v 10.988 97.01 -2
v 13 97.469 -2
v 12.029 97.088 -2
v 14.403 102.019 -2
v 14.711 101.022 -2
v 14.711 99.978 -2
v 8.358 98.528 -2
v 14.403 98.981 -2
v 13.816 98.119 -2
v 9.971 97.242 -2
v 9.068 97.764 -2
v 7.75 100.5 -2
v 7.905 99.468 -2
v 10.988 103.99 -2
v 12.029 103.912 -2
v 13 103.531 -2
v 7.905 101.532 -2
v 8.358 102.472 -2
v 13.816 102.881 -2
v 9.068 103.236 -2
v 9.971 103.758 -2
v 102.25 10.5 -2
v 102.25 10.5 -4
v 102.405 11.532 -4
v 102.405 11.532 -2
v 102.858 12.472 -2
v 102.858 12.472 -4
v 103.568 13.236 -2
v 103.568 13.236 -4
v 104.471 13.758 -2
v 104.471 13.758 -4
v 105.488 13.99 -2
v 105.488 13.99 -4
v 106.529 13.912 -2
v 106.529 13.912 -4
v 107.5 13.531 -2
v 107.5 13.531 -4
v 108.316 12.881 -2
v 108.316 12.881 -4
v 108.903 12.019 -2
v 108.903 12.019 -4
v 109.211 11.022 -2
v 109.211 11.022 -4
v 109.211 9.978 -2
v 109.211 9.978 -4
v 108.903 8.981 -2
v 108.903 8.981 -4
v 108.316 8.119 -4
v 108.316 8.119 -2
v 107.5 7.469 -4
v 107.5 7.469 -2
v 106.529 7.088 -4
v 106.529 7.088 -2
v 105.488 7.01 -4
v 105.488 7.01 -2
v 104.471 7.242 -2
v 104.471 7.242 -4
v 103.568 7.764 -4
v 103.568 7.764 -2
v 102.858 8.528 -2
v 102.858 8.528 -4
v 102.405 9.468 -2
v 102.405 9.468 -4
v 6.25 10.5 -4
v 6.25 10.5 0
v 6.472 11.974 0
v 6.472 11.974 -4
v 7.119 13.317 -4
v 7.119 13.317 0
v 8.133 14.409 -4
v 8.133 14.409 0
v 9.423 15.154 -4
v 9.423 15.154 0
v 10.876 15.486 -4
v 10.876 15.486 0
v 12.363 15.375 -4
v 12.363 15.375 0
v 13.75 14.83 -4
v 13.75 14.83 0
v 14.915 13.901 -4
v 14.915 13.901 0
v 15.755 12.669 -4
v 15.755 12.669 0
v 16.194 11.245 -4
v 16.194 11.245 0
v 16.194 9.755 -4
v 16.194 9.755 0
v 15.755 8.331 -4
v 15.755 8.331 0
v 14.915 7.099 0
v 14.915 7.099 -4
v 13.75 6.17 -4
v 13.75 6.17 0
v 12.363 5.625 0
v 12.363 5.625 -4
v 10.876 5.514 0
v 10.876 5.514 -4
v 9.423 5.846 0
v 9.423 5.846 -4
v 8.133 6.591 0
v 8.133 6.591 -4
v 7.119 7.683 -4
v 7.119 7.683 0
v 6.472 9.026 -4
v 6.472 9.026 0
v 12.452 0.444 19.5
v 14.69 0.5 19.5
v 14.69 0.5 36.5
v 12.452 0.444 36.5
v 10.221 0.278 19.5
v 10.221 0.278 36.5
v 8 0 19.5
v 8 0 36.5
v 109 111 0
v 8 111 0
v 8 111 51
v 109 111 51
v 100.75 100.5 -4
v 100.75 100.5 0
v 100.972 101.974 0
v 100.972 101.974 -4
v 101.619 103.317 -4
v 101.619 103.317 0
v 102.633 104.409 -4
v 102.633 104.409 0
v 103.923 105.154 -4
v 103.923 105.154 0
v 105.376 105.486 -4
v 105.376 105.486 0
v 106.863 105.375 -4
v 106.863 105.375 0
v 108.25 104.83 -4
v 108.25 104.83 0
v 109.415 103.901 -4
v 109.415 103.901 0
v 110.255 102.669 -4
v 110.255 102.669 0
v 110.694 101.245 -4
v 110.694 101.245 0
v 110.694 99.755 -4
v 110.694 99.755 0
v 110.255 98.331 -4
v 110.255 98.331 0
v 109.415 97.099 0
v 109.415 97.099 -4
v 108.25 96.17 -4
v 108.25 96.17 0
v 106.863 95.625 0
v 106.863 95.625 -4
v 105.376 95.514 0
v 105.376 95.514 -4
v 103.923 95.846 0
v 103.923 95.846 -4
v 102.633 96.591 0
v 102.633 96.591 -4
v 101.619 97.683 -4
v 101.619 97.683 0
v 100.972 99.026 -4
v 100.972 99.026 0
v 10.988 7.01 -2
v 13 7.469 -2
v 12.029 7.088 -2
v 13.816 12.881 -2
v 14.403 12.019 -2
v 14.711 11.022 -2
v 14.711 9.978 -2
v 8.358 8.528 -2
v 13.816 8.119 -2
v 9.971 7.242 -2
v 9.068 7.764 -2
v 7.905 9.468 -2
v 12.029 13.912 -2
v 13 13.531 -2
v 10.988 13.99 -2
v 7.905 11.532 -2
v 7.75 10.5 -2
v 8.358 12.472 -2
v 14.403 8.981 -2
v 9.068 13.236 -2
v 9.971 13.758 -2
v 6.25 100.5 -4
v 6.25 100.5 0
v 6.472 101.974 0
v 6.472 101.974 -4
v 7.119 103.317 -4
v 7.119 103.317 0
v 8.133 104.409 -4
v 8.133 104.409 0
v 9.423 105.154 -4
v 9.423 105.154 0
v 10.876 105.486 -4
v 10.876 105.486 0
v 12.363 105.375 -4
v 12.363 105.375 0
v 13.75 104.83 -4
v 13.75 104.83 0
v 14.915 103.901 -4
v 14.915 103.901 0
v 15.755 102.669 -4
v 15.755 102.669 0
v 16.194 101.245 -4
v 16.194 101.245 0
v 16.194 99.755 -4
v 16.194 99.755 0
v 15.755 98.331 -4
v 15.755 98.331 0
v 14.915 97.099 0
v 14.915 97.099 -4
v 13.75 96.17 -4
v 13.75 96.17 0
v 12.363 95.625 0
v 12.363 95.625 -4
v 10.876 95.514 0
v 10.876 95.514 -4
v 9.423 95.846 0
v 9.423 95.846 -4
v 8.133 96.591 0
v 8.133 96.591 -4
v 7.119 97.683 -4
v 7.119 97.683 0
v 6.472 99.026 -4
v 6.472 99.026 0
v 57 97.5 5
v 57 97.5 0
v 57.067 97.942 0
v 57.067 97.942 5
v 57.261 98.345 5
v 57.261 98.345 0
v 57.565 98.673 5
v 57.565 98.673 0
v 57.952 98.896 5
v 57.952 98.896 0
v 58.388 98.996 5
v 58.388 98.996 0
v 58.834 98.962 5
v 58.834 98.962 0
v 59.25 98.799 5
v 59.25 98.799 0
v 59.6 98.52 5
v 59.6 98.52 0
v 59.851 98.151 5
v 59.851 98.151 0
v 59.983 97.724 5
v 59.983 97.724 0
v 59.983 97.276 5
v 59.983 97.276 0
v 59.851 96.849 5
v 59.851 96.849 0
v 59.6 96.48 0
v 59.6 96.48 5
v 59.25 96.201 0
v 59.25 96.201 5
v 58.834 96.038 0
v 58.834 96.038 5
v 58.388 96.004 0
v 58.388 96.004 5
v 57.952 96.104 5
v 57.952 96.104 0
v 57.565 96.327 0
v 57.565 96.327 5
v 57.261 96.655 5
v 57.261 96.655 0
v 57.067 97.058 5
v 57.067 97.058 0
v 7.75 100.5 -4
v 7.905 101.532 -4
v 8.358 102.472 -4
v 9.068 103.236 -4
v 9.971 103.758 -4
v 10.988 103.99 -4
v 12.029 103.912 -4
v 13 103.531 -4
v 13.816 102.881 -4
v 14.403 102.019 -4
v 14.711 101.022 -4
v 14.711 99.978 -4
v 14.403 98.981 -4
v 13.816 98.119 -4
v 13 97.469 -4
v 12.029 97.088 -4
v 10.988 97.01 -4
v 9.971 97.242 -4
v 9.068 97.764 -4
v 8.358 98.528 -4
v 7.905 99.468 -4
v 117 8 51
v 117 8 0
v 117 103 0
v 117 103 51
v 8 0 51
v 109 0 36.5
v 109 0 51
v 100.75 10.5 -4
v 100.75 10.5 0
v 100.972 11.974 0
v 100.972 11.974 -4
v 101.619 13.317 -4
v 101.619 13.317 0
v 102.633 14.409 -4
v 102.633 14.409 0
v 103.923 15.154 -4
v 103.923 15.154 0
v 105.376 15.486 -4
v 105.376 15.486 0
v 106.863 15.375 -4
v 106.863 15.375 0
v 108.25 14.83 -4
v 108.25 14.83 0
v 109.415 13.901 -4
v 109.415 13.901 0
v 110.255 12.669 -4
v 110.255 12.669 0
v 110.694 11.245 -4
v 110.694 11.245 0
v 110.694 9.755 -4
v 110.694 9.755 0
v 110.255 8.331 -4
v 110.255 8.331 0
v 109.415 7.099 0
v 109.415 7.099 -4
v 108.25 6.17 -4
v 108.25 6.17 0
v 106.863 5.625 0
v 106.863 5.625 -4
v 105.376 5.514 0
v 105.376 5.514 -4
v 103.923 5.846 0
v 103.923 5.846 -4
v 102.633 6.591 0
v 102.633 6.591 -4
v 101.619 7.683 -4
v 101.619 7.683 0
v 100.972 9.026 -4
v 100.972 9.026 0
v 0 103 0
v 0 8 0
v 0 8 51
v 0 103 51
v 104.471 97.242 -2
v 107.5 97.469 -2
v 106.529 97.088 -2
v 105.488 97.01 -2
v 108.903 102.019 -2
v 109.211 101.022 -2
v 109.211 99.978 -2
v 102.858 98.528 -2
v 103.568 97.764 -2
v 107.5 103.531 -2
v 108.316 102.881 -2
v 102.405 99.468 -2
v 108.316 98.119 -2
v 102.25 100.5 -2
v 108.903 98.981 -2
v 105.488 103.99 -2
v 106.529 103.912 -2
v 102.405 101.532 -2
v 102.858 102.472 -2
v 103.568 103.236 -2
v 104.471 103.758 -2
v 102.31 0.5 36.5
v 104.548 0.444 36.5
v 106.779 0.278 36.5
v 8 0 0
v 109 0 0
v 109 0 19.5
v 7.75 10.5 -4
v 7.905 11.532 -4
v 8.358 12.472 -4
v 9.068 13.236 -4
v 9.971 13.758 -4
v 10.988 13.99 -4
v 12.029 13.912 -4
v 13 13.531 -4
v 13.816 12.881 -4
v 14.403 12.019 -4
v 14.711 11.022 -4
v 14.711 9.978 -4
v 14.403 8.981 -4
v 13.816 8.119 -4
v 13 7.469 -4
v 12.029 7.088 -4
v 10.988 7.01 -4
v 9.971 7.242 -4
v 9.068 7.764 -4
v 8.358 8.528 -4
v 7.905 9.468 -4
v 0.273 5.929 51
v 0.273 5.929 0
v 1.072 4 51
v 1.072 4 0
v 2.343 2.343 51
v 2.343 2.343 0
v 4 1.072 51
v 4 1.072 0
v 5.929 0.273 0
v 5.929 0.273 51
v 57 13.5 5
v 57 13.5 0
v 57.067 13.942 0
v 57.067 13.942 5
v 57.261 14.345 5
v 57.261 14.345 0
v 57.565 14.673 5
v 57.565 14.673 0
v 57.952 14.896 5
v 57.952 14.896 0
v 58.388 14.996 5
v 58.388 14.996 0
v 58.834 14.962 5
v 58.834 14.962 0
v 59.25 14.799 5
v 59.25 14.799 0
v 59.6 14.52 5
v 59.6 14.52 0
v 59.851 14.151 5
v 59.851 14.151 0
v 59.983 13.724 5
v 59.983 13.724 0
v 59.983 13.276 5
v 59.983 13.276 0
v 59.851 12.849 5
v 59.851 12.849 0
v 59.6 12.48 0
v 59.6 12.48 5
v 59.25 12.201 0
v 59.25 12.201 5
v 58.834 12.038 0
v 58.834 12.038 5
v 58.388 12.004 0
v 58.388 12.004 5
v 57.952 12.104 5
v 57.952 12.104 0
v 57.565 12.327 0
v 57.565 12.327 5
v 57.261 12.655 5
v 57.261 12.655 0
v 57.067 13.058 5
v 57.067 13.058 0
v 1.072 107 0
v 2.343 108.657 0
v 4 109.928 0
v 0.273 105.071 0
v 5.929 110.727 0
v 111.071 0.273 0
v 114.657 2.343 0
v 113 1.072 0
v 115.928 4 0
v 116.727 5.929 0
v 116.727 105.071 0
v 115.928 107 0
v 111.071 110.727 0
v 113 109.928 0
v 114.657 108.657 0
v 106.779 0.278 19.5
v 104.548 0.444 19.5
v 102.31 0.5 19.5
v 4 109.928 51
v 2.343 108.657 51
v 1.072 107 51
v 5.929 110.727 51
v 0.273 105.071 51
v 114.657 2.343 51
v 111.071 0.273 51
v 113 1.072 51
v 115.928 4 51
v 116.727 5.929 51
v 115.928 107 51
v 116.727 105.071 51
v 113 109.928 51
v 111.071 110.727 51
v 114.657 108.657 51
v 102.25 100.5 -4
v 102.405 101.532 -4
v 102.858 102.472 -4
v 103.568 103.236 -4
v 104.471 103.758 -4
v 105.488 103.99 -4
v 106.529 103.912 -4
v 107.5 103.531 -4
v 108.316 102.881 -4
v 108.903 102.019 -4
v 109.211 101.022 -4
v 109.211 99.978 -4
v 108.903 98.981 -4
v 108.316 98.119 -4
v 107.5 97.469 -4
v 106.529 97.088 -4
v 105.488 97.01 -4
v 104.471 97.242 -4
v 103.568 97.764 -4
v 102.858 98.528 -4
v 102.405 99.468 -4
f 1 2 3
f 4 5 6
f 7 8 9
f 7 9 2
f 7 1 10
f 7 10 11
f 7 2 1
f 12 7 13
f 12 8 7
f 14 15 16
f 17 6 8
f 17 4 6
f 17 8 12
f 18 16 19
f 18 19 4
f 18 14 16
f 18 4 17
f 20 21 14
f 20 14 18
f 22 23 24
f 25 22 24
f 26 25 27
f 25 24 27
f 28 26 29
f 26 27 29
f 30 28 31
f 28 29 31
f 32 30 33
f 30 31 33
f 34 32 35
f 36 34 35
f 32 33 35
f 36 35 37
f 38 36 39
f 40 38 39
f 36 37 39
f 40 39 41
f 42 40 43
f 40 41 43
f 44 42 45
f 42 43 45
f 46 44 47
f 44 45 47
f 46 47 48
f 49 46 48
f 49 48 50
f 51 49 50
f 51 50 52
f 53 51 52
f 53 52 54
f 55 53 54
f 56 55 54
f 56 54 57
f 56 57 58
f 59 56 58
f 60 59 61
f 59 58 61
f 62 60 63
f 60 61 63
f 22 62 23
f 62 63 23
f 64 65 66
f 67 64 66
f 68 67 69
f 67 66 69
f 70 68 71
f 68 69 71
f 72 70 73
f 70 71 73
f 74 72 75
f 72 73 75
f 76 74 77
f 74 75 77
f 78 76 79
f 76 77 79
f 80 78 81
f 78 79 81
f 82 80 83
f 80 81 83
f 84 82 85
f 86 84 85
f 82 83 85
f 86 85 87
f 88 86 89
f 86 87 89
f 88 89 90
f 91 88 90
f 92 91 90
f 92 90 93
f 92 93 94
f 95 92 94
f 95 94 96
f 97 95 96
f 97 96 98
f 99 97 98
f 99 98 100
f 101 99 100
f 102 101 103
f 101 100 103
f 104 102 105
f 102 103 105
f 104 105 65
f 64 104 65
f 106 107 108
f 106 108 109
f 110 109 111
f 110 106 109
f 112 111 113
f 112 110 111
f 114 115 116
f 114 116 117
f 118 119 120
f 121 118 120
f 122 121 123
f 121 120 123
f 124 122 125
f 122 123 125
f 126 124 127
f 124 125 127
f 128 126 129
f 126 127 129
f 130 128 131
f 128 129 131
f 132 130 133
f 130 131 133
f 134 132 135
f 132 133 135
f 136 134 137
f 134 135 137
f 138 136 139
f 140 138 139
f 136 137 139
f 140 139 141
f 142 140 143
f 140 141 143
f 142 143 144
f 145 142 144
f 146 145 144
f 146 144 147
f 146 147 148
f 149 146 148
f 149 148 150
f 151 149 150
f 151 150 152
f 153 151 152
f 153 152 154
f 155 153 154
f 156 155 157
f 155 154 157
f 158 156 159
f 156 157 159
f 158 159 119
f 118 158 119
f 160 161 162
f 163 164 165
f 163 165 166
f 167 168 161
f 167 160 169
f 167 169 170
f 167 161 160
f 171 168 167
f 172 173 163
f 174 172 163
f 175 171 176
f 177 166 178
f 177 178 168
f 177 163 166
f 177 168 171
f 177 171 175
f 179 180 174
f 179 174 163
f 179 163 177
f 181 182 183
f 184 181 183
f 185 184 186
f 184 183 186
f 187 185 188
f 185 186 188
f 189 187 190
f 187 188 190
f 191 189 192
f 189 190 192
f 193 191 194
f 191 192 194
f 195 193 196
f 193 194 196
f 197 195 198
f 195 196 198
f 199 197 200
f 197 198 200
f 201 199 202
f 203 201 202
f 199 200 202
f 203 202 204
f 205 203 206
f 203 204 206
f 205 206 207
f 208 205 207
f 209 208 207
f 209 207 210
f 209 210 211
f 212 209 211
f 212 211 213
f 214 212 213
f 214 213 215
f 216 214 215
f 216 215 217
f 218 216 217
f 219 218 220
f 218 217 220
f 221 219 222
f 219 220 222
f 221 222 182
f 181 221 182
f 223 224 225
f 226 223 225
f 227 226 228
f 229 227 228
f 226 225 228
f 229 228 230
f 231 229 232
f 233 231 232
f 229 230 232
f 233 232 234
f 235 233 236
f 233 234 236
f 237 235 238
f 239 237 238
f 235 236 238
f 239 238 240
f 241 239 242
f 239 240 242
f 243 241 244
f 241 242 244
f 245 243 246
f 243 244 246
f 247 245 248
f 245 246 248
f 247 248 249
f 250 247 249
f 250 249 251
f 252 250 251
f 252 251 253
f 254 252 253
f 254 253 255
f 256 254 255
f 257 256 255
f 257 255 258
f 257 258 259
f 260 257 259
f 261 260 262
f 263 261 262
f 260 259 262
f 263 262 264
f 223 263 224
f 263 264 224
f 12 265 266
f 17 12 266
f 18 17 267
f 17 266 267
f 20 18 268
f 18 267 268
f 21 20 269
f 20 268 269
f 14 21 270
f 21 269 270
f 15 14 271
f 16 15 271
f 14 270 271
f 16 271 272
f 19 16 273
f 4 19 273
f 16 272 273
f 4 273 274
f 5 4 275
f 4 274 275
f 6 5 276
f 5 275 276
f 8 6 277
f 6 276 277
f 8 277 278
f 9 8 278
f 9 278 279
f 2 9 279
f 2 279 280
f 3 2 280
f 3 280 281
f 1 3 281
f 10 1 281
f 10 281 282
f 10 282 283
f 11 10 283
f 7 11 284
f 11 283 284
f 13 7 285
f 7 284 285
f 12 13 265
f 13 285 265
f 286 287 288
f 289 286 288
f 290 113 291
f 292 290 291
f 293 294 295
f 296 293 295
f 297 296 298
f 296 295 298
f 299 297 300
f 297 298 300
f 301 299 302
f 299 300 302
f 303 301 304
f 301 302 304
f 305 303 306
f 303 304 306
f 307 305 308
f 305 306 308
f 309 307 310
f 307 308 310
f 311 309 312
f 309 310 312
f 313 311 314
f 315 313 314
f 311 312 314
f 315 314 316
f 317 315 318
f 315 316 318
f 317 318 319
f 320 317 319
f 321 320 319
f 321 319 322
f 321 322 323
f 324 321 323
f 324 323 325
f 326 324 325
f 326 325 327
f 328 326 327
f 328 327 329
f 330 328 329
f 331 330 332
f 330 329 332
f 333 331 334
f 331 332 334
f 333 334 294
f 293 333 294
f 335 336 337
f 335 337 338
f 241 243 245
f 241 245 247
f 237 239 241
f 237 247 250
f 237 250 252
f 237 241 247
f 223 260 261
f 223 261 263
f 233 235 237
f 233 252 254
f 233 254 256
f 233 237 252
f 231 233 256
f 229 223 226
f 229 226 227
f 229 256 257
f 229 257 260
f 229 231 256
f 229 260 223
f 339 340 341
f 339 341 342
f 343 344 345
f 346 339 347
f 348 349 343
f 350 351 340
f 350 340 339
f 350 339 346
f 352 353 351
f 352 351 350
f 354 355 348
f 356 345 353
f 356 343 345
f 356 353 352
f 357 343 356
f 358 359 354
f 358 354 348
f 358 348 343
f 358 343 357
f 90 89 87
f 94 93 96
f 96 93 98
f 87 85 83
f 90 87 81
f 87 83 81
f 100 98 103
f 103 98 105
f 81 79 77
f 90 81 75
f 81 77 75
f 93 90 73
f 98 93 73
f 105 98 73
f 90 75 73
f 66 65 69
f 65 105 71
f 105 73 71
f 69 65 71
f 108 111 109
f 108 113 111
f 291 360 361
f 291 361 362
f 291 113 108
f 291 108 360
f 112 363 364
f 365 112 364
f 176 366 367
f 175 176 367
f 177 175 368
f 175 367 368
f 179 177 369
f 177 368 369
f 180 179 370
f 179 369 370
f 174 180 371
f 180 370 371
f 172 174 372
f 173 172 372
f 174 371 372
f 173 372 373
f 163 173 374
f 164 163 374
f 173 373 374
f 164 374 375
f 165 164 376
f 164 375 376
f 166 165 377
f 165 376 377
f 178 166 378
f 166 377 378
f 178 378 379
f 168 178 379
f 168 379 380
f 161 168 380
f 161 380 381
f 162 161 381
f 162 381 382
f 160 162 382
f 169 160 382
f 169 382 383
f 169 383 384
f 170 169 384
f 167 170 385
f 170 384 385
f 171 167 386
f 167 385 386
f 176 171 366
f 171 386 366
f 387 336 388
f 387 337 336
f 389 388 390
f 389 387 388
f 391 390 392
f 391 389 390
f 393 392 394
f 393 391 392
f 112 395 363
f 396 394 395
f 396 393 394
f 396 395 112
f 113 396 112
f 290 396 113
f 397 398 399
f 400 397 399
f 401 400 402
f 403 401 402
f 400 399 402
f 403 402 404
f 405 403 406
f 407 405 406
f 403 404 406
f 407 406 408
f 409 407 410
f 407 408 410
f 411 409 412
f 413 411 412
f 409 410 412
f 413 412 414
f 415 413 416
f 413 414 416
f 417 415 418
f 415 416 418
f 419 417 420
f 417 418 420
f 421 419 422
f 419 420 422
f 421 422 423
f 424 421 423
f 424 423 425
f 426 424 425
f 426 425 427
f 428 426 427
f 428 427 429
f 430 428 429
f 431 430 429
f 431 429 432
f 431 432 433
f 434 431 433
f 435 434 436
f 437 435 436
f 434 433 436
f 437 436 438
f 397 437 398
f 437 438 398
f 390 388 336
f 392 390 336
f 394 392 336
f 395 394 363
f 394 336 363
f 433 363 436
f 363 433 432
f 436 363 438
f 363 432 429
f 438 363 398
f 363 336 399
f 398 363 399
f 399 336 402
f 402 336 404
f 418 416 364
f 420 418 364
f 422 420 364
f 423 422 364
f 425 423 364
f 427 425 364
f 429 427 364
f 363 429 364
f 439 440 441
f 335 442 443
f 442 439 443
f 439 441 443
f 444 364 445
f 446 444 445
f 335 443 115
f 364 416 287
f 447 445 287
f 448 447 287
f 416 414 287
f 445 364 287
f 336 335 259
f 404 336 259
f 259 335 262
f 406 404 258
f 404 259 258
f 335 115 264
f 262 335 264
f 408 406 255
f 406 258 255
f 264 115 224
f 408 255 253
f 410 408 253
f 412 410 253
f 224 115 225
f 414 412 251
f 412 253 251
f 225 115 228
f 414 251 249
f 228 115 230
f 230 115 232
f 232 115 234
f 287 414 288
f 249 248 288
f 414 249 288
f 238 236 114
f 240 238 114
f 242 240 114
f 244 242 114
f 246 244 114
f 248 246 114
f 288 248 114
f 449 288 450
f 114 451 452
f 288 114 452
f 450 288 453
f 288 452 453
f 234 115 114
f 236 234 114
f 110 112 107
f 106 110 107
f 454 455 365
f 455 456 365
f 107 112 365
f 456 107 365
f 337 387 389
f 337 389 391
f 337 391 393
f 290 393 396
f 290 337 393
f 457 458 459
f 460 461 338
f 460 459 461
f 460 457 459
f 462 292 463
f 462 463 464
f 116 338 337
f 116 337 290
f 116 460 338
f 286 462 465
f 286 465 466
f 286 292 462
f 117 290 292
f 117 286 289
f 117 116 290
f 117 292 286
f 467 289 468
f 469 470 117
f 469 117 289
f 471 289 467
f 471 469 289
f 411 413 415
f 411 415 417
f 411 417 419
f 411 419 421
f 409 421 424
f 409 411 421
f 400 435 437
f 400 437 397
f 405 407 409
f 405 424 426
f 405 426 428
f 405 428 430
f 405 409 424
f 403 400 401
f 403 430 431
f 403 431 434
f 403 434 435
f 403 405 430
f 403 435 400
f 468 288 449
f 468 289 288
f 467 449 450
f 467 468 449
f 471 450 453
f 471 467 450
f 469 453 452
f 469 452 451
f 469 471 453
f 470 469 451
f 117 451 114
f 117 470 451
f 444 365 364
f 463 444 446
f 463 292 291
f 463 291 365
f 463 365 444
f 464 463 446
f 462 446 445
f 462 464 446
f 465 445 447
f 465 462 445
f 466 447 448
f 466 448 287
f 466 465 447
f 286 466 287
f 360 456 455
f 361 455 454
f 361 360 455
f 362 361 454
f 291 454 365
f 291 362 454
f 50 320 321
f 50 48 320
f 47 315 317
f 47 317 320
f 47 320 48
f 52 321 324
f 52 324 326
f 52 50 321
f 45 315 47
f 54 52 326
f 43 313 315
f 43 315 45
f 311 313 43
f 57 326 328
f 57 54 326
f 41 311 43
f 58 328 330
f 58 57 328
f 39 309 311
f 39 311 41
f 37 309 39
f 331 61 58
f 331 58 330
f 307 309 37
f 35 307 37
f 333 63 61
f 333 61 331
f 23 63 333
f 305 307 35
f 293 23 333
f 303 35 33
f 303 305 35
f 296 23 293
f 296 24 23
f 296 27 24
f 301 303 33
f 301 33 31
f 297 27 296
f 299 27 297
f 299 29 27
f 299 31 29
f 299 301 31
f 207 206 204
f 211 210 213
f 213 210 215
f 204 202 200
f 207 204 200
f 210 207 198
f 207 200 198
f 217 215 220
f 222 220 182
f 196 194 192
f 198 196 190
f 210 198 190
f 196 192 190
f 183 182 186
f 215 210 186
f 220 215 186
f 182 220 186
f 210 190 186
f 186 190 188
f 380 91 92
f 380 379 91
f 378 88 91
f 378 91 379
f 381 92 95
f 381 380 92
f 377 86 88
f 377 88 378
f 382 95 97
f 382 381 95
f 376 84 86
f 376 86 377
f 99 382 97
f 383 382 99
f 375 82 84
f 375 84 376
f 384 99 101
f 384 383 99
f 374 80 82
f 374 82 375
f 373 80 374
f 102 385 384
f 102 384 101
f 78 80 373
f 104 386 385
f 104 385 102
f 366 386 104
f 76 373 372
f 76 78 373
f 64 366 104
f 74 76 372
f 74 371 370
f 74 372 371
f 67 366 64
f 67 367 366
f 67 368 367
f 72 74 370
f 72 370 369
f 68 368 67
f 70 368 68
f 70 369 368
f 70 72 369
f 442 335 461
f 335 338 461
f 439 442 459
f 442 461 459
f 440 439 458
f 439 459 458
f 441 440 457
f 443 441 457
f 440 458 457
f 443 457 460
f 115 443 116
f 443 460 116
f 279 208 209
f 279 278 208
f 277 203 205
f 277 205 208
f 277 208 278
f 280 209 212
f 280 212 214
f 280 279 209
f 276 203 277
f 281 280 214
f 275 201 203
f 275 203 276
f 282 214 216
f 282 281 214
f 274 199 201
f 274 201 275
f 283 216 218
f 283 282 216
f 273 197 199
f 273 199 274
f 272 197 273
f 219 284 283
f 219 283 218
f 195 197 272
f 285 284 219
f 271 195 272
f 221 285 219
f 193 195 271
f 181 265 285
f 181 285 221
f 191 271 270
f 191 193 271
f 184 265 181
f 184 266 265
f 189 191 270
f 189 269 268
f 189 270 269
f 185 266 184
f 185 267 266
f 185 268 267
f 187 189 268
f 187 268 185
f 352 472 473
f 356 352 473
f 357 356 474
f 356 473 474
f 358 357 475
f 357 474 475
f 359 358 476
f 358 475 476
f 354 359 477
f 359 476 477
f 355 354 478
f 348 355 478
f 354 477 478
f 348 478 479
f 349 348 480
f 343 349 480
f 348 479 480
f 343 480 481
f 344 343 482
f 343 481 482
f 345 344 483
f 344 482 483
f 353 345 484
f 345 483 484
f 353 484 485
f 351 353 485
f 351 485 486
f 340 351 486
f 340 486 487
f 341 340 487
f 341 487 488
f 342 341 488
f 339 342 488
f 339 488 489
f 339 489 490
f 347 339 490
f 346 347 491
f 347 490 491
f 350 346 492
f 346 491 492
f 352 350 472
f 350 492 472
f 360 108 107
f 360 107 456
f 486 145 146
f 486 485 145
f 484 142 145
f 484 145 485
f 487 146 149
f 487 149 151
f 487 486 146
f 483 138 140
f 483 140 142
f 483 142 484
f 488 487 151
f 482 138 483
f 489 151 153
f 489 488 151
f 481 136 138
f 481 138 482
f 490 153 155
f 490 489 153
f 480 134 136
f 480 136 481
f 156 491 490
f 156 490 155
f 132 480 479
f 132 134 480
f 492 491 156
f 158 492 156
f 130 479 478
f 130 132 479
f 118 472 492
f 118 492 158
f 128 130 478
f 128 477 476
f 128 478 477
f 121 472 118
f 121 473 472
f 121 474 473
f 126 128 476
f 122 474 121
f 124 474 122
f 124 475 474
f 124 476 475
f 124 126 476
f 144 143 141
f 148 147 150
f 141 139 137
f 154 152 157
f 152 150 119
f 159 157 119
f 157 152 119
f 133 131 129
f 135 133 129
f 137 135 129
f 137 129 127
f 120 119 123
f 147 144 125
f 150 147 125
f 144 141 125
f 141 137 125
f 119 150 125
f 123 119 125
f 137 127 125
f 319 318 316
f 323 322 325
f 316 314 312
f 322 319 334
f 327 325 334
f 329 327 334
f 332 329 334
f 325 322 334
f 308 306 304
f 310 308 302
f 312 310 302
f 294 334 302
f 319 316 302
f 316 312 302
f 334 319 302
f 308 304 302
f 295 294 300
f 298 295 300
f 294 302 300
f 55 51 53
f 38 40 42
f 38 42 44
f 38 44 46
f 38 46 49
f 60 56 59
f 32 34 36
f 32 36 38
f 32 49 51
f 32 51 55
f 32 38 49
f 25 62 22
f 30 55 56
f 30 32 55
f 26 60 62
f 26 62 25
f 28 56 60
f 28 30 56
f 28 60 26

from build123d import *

# Parameters (mm, degrees)
SKETCH_1_W          = 117
SKETCH_1_H          = 111
EXTRUDE_1_DEPTH     = 51
FILLET_1_R          = 8
SKETCH_2_W          = 101
SKETCH_2_H          = 17
CUT_EXTRUDE_1_DEPTH = 0.5
FILLET_2_R          = 45
SKETCH_4_R          = 5
EXTRUDE_3_DEPTH     = 4
EXTRUDE_3_2_DEPTH   = 4
EXTRUDE_3_3_DEPTH   = 4
EXTRUDE_3_4_DEPTH   = 4
SKETCH_5_R          = 3.5
CUT_EXTRUDE_2_DEPTH = 2
SKETCH_6_R          = 1.5
CUT_EXTRUDE_3_DEPTH = 5


with BuildPart() as part:
    # 草图1 → 凸台-拉伸1 (new body)
    with BuildSketch(Plane.XY):
        with Locations((58.5, 55.5)):
            Rectangle(SKETCH_1_W, SKETCH_1_H)
    extrude(amount=EXTRUDE_1_DEPTH)

    # 圆角1
    fillet_1_edges = [part.edges().sort_by_distance(p)[0] for p in [
        (0, 111, 25.5),
        (117, 111, 25.5),
        (117, 0, 25.5),
        (0, 0, 25.5),
    ]]
    fillet(fillet_1_edges, radius=FILLET_1_R)

    # 草图2 → 切除-拉伸1 (cut)
    with BuildSketch(Plane.XZ):
        with Locations((58.5, 28)):
            Rectangle(SKETCH_2_W, SKETCH_2_H)
    extrude(amount=-CUT_EXTRUDE_1_DEPTH, mode=Mode.SUBTRACT)

    # 圆角2
    # the kernel refuses this fillet: 45 mm, written as the material it adds along each edge
    with BuildSketch(Plane(origin=(109, 0.5, 36.5), x_dir=(0, -1, 0), z_dir=(0, 0, -1)), Plane(origin=(8, 0.5, 2.7761398), x_dir=(0, -1, 0), z_dir=(0, 0, 1))) as fillet_2_piece_1:
        with BuildLine():
            CenterArc((45, 6.68954408), FILLET_2_R, 180, 8.549078831)
            Line((0, 6.68954408), (0, 0))
            Line((0, 0), (0.5, 0))
        make_face()
    extrude(amount=33.7238602)

    # 草图6 → 切除-拉伸3 (cut)
    with BuildSketch(Plane(origin=(0, 0, 0), x_dir=(-1, 0, 0), z_dir=(0, 0, -1))):
        with Locations((-58.5, 97.5)):
            Circle(SKETCH_6_R)
        with Locations((-58.5, 13.5)):
            Circle(SKETCH_6_R)
    extrude(amount=-CUT_EXTRUDE_3_DEPTH, mode=Mode.SUBTRACT)


with BuildPart() as body_2:
    # 草图4 → 凸台-拉伸3 (new body)
    with BuildSketch(Plane(origin=(0, 0, 0), x_dir=(-1, 0, 0), z_dir=(0, 0, -1))):
        with Locations((-105.75, 100.5)):
            Circle(SKETCH_4_R)
    extrude(amount=EXTRUDE_3_DEPTH)


with BuildPart() as body_3:
    # 草图4 → Extrude 3 2 (new body)
    with BuildSketch(Plane(origin=(0, 0, 0), x_dir=(-1, 0, 0), z_dir=(0, 0, -1))):
        with Locations((-105.75, 10.5)):
            Circle(SKETCH_4_R)
    extrude(amount=EXTRUDE_3_2_DEPTH)


with BuildPart() as body_4:
    # 草图4 → Extrude 3 3 (new body)
    with BuildSketch(Plane(origin=(0, 0, 0), x_dir=(-1, 0, 0), z_dir=(0, 0, -1))):
        with Locations((-11.25, 10.5)):
            Circle(SKETCH_4_R)
    extrude(amount=EXTRUDE_3_3_DEPTH)


with BuildPart() as body_5:
    # 草图4 → Extrude 3 4 (new body)
    with BuildSketch(Plane(origin=(0, 0, 0), x_dir=(-1, 0, 0), z_dir=(0, 0, -1))):
        with Locations((-11.25, 100.5)):
            Circle(SKETCH_4_R)
    extrude(amount=EXTRUDE_3_4_DEPTH)


with BuildPart() as cut_extrude_2_tool:
    # 草图5 → 切除-拉伸2 (new body)
    with BuildSketch(Plane(origin=(0, 0, -4), x_dir=(-1, 0, 0), z_dir=(0, 0, -1))):
        with Locations((-105.75, 100.5)):
            Circle(SKETCH_5_R)
        with Locations((-105.75, 10.5)):
            Circle(SKETCH_5_R)
        with Locations((-11.25, 10.5)):
            Circle(SKETCH_5_R)
        with Locations((-11.25, 100.5)):
            Circle(SKETCH_5_R)
    extrude(amount=-CUT_EXTRUDE_2_DEPTH)


with BuildPart() as body_2_1:
    add(body_2.part)

    # 切除-拉伸2: cut by cut_extrude_2_tool
    add(cut_extrude_2_tool.part, mode=Mode.SUBTRACT)


with BuildPart() as body_3_1:
    add(body_3.part)

    # 切除-拉伸2: cut by cut_extrude_2_tool
    add(cut_extrude_2_tool.part, mode=Mode.SUBTRACT)


with BuildPart() as body_4_1:
    add(body_4.part)

    # 切除-拉伸2: cut by cut_extrude_2_tool
    add(cut_extrude_2_tool.part, mode=Mode.SUBTRACT)


with BuildPart() as body_5_1:
    add(body_5.part)

    # 切除-拉伸2: cut by cut_extrude_2_tool
    add(cut_extrude_2_tool.part, mode=Mode.SUBTRACT)


solid = Compound([part.part, body_2_1.part, body_3_1.part, body_4_1.part, body_5_1.part])
